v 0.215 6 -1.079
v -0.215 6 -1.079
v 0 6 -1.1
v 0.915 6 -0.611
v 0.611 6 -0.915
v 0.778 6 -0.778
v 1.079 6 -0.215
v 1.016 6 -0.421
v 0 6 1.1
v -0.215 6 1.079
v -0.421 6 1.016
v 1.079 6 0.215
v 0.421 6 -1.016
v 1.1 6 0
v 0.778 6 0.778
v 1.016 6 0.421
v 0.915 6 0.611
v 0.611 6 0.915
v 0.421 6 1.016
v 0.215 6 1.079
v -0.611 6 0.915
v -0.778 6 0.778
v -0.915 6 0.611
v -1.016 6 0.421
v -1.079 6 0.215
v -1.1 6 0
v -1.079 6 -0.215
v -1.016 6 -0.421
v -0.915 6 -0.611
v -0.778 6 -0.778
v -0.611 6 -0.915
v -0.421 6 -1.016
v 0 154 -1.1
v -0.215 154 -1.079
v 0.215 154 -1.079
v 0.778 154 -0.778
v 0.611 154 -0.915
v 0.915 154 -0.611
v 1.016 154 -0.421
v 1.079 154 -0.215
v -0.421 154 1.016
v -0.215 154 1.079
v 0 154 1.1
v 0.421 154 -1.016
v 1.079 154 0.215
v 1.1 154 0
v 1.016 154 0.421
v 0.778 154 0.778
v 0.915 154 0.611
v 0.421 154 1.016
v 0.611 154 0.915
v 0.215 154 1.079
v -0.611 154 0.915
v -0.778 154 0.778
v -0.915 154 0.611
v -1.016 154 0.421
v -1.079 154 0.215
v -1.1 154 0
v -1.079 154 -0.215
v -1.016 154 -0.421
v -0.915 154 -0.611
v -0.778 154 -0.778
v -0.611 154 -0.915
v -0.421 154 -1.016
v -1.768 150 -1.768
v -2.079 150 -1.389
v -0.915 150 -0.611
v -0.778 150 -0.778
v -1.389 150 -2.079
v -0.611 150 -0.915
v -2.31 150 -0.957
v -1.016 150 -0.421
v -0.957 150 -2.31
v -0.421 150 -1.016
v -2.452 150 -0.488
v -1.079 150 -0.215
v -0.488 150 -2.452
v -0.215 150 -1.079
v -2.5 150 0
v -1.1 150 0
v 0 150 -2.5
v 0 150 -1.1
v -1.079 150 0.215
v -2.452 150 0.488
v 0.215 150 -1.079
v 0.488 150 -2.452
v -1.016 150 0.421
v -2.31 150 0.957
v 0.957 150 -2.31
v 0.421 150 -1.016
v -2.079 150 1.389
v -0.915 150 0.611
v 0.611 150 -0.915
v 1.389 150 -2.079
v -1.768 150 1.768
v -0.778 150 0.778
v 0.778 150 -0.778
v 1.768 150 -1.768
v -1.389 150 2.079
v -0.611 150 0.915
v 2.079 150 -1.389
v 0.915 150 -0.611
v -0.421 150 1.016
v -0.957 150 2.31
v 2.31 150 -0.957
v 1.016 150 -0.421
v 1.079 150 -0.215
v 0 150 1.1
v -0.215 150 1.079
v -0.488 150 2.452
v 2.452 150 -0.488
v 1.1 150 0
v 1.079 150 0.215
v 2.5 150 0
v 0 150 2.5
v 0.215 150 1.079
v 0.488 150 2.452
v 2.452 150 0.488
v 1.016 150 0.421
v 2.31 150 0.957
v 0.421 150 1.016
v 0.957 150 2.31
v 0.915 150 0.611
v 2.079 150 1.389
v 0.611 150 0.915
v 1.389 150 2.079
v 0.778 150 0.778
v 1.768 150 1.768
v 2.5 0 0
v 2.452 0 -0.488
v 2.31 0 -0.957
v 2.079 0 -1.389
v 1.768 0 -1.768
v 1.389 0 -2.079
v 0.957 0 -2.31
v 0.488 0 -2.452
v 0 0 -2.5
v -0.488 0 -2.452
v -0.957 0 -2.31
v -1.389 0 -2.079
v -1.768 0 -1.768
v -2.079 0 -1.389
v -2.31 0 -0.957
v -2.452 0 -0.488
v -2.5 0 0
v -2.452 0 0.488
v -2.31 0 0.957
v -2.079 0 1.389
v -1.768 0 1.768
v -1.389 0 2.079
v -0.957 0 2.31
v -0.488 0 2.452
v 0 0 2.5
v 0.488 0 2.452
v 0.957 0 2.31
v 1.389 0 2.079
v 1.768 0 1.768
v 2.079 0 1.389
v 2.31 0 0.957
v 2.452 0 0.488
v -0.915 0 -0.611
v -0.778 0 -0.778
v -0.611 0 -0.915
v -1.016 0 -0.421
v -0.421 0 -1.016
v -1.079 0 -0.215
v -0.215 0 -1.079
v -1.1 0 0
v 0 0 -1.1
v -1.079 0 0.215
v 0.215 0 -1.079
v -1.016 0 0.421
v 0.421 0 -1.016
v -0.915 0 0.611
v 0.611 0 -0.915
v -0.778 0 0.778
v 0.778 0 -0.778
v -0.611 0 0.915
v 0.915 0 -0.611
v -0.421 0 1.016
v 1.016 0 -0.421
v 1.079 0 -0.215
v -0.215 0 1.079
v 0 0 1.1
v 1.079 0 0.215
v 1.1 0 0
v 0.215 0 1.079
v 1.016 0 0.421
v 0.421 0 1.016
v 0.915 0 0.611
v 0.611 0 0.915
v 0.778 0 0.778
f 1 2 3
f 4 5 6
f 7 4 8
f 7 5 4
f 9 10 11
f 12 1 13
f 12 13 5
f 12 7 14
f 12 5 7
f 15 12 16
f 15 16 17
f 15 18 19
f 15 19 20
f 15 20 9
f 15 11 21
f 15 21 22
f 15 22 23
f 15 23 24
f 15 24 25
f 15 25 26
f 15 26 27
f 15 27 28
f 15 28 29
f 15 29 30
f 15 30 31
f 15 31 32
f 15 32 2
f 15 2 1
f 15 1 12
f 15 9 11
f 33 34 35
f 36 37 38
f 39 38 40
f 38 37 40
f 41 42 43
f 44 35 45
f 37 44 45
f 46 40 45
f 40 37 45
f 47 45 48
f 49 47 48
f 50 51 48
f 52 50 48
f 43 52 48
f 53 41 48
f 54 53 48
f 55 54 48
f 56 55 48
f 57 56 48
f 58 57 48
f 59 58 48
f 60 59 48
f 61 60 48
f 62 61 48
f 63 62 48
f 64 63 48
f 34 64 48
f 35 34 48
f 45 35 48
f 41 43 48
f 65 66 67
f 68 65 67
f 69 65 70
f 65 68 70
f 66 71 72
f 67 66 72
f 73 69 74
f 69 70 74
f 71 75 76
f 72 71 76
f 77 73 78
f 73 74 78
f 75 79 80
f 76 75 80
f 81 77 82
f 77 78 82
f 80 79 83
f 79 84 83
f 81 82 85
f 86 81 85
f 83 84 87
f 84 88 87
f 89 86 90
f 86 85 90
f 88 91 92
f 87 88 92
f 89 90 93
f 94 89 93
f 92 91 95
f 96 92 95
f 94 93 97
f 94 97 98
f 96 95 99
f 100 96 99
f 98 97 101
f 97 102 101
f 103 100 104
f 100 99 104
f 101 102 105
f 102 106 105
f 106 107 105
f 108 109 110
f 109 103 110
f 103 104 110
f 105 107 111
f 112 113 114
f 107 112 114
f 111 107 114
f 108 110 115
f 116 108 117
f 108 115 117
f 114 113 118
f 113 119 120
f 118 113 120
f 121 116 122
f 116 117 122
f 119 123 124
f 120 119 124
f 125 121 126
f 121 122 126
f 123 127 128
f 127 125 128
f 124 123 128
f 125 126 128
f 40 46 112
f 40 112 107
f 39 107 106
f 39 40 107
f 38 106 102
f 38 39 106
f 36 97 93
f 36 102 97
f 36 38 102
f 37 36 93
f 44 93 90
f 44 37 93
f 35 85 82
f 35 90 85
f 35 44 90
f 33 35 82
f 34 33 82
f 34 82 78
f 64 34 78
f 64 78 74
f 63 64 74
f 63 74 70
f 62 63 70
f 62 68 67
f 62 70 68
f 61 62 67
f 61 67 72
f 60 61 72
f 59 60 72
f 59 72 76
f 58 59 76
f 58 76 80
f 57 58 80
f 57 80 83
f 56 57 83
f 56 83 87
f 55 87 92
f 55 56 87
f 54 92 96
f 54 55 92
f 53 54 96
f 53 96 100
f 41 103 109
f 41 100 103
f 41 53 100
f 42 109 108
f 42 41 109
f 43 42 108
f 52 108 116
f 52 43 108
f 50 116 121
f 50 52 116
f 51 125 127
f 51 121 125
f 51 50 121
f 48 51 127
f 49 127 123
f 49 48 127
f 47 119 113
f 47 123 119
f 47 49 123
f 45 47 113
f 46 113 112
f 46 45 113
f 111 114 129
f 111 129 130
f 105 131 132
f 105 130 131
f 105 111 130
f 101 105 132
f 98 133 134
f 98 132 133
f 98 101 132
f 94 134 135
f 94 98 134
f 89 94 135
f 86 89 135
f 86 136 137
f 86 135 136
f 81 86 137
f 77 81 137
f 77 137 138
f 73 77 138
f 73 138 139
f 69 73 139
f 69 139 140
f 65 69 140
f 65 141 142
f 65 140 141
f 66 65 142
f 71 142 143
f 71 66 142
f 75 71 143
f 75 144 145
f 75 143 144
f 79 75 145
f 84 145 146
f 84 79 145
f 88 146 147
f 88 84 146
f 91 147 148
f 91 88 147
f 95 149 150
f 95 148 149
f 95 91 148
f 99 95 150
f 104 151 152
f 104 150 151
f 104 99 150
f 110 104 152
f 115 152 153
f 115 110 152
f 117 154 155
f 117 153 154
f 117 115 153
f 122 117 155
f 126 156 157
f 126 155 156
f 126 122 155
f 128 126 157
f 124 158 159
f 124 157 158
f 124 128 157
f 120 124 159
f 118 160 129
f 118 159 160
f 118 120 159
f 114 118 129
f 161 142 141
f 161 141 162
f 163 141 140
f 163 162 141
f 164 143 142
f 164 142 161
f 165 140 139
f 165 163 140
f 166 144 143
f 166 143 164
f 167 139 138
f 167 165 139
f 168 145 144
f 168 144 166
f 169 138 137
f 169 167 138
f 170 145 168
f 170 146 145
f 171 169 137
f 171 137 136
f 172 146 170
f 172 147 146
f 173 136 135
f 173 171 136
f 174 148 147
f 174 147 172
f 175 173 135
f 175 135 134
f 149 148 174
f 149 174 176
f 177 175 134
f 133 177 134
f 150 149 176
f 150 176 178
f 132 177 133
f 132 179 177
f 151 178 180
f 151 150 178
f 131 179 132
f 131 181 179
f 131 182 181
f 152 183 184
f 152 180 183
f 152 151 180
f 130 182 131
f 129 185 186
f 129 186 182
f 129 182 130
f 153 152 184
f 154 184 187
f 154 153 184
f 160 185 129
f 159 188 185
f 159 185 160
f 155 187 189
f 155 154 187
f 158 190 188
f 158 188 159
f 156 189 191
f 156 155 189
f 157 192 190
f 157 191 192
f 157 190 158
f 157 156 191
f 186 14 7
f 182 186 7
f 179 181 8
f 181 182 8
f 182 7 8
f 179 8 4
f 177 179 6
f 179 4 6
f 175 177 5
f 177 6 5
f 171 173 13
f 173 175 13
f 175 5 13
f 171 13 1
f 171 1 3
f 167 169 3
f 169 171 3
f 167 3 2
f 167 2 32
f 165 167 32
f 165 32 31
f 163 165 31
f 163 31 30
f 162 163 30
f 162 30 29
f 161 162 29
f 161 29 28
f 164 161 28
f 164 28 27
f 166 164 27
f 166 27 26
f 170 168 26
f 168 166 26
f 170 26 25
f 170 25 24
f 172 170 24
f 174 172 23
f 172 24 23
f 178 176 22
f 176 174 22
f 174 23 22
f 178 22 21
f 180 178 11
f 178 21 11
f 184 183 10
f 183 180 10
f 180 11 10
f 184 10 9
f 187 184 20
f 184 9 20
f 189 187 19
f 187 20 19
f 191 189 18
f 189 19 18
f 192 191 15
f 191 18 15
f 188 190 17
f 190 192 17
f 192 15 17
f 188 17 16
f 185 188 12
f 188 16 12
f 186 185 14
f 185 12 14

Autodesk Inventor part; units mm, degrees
ref_plane "YZ Plane" through (0, 0, 0) normal (1, 0, 0) x (0, 1, 0)
ref_plane "XZ Plane" through (0, 0, 0) normal (0, 1, 0) x (-1, 0, 0)
ref_plane "XY Plane" through (0, 0, 0) normal (0, 0, 1) x (1, 0, 0)
sketch "スケッチ2" plane through (0, 0, 0) normal (0, 0, 1) x (1, 0, 0)
  line L0 (0, 0) -> (2.5, 0)
  line L1 (2.5, 0) -> (2.5, 150)
  line L2 (2.5, 150) -> (0, 150)
  line L3 (0, 150) -> (0, 0)
  line L4 (1.1, 0) -> (1.1, 6)
  line L5 (1.1, 6) -> (0, 6)
  line L6 (1.1, 150) -> (1.1, 154)
  line L7 (1.1, 154) -> (0, 154)
  line L8 (0, 154) -> (0, 150)
  dimension "d4" = 2.5
  dimension "d5" = 150
  dimension "d6" = 1.1
  dimension "d7" = 6
  dimension "d8" = 1.1
  dimension "d9" = 4
revolve "回転1" add sketch "スケッチ2" angle 360 about axis through (0, 150, 0) along (0, -1, 0) contours L4 L5 L3 L2 L1 L0 | L8 L7 L6 L2
properties part number "BaseSpacer_M3"
